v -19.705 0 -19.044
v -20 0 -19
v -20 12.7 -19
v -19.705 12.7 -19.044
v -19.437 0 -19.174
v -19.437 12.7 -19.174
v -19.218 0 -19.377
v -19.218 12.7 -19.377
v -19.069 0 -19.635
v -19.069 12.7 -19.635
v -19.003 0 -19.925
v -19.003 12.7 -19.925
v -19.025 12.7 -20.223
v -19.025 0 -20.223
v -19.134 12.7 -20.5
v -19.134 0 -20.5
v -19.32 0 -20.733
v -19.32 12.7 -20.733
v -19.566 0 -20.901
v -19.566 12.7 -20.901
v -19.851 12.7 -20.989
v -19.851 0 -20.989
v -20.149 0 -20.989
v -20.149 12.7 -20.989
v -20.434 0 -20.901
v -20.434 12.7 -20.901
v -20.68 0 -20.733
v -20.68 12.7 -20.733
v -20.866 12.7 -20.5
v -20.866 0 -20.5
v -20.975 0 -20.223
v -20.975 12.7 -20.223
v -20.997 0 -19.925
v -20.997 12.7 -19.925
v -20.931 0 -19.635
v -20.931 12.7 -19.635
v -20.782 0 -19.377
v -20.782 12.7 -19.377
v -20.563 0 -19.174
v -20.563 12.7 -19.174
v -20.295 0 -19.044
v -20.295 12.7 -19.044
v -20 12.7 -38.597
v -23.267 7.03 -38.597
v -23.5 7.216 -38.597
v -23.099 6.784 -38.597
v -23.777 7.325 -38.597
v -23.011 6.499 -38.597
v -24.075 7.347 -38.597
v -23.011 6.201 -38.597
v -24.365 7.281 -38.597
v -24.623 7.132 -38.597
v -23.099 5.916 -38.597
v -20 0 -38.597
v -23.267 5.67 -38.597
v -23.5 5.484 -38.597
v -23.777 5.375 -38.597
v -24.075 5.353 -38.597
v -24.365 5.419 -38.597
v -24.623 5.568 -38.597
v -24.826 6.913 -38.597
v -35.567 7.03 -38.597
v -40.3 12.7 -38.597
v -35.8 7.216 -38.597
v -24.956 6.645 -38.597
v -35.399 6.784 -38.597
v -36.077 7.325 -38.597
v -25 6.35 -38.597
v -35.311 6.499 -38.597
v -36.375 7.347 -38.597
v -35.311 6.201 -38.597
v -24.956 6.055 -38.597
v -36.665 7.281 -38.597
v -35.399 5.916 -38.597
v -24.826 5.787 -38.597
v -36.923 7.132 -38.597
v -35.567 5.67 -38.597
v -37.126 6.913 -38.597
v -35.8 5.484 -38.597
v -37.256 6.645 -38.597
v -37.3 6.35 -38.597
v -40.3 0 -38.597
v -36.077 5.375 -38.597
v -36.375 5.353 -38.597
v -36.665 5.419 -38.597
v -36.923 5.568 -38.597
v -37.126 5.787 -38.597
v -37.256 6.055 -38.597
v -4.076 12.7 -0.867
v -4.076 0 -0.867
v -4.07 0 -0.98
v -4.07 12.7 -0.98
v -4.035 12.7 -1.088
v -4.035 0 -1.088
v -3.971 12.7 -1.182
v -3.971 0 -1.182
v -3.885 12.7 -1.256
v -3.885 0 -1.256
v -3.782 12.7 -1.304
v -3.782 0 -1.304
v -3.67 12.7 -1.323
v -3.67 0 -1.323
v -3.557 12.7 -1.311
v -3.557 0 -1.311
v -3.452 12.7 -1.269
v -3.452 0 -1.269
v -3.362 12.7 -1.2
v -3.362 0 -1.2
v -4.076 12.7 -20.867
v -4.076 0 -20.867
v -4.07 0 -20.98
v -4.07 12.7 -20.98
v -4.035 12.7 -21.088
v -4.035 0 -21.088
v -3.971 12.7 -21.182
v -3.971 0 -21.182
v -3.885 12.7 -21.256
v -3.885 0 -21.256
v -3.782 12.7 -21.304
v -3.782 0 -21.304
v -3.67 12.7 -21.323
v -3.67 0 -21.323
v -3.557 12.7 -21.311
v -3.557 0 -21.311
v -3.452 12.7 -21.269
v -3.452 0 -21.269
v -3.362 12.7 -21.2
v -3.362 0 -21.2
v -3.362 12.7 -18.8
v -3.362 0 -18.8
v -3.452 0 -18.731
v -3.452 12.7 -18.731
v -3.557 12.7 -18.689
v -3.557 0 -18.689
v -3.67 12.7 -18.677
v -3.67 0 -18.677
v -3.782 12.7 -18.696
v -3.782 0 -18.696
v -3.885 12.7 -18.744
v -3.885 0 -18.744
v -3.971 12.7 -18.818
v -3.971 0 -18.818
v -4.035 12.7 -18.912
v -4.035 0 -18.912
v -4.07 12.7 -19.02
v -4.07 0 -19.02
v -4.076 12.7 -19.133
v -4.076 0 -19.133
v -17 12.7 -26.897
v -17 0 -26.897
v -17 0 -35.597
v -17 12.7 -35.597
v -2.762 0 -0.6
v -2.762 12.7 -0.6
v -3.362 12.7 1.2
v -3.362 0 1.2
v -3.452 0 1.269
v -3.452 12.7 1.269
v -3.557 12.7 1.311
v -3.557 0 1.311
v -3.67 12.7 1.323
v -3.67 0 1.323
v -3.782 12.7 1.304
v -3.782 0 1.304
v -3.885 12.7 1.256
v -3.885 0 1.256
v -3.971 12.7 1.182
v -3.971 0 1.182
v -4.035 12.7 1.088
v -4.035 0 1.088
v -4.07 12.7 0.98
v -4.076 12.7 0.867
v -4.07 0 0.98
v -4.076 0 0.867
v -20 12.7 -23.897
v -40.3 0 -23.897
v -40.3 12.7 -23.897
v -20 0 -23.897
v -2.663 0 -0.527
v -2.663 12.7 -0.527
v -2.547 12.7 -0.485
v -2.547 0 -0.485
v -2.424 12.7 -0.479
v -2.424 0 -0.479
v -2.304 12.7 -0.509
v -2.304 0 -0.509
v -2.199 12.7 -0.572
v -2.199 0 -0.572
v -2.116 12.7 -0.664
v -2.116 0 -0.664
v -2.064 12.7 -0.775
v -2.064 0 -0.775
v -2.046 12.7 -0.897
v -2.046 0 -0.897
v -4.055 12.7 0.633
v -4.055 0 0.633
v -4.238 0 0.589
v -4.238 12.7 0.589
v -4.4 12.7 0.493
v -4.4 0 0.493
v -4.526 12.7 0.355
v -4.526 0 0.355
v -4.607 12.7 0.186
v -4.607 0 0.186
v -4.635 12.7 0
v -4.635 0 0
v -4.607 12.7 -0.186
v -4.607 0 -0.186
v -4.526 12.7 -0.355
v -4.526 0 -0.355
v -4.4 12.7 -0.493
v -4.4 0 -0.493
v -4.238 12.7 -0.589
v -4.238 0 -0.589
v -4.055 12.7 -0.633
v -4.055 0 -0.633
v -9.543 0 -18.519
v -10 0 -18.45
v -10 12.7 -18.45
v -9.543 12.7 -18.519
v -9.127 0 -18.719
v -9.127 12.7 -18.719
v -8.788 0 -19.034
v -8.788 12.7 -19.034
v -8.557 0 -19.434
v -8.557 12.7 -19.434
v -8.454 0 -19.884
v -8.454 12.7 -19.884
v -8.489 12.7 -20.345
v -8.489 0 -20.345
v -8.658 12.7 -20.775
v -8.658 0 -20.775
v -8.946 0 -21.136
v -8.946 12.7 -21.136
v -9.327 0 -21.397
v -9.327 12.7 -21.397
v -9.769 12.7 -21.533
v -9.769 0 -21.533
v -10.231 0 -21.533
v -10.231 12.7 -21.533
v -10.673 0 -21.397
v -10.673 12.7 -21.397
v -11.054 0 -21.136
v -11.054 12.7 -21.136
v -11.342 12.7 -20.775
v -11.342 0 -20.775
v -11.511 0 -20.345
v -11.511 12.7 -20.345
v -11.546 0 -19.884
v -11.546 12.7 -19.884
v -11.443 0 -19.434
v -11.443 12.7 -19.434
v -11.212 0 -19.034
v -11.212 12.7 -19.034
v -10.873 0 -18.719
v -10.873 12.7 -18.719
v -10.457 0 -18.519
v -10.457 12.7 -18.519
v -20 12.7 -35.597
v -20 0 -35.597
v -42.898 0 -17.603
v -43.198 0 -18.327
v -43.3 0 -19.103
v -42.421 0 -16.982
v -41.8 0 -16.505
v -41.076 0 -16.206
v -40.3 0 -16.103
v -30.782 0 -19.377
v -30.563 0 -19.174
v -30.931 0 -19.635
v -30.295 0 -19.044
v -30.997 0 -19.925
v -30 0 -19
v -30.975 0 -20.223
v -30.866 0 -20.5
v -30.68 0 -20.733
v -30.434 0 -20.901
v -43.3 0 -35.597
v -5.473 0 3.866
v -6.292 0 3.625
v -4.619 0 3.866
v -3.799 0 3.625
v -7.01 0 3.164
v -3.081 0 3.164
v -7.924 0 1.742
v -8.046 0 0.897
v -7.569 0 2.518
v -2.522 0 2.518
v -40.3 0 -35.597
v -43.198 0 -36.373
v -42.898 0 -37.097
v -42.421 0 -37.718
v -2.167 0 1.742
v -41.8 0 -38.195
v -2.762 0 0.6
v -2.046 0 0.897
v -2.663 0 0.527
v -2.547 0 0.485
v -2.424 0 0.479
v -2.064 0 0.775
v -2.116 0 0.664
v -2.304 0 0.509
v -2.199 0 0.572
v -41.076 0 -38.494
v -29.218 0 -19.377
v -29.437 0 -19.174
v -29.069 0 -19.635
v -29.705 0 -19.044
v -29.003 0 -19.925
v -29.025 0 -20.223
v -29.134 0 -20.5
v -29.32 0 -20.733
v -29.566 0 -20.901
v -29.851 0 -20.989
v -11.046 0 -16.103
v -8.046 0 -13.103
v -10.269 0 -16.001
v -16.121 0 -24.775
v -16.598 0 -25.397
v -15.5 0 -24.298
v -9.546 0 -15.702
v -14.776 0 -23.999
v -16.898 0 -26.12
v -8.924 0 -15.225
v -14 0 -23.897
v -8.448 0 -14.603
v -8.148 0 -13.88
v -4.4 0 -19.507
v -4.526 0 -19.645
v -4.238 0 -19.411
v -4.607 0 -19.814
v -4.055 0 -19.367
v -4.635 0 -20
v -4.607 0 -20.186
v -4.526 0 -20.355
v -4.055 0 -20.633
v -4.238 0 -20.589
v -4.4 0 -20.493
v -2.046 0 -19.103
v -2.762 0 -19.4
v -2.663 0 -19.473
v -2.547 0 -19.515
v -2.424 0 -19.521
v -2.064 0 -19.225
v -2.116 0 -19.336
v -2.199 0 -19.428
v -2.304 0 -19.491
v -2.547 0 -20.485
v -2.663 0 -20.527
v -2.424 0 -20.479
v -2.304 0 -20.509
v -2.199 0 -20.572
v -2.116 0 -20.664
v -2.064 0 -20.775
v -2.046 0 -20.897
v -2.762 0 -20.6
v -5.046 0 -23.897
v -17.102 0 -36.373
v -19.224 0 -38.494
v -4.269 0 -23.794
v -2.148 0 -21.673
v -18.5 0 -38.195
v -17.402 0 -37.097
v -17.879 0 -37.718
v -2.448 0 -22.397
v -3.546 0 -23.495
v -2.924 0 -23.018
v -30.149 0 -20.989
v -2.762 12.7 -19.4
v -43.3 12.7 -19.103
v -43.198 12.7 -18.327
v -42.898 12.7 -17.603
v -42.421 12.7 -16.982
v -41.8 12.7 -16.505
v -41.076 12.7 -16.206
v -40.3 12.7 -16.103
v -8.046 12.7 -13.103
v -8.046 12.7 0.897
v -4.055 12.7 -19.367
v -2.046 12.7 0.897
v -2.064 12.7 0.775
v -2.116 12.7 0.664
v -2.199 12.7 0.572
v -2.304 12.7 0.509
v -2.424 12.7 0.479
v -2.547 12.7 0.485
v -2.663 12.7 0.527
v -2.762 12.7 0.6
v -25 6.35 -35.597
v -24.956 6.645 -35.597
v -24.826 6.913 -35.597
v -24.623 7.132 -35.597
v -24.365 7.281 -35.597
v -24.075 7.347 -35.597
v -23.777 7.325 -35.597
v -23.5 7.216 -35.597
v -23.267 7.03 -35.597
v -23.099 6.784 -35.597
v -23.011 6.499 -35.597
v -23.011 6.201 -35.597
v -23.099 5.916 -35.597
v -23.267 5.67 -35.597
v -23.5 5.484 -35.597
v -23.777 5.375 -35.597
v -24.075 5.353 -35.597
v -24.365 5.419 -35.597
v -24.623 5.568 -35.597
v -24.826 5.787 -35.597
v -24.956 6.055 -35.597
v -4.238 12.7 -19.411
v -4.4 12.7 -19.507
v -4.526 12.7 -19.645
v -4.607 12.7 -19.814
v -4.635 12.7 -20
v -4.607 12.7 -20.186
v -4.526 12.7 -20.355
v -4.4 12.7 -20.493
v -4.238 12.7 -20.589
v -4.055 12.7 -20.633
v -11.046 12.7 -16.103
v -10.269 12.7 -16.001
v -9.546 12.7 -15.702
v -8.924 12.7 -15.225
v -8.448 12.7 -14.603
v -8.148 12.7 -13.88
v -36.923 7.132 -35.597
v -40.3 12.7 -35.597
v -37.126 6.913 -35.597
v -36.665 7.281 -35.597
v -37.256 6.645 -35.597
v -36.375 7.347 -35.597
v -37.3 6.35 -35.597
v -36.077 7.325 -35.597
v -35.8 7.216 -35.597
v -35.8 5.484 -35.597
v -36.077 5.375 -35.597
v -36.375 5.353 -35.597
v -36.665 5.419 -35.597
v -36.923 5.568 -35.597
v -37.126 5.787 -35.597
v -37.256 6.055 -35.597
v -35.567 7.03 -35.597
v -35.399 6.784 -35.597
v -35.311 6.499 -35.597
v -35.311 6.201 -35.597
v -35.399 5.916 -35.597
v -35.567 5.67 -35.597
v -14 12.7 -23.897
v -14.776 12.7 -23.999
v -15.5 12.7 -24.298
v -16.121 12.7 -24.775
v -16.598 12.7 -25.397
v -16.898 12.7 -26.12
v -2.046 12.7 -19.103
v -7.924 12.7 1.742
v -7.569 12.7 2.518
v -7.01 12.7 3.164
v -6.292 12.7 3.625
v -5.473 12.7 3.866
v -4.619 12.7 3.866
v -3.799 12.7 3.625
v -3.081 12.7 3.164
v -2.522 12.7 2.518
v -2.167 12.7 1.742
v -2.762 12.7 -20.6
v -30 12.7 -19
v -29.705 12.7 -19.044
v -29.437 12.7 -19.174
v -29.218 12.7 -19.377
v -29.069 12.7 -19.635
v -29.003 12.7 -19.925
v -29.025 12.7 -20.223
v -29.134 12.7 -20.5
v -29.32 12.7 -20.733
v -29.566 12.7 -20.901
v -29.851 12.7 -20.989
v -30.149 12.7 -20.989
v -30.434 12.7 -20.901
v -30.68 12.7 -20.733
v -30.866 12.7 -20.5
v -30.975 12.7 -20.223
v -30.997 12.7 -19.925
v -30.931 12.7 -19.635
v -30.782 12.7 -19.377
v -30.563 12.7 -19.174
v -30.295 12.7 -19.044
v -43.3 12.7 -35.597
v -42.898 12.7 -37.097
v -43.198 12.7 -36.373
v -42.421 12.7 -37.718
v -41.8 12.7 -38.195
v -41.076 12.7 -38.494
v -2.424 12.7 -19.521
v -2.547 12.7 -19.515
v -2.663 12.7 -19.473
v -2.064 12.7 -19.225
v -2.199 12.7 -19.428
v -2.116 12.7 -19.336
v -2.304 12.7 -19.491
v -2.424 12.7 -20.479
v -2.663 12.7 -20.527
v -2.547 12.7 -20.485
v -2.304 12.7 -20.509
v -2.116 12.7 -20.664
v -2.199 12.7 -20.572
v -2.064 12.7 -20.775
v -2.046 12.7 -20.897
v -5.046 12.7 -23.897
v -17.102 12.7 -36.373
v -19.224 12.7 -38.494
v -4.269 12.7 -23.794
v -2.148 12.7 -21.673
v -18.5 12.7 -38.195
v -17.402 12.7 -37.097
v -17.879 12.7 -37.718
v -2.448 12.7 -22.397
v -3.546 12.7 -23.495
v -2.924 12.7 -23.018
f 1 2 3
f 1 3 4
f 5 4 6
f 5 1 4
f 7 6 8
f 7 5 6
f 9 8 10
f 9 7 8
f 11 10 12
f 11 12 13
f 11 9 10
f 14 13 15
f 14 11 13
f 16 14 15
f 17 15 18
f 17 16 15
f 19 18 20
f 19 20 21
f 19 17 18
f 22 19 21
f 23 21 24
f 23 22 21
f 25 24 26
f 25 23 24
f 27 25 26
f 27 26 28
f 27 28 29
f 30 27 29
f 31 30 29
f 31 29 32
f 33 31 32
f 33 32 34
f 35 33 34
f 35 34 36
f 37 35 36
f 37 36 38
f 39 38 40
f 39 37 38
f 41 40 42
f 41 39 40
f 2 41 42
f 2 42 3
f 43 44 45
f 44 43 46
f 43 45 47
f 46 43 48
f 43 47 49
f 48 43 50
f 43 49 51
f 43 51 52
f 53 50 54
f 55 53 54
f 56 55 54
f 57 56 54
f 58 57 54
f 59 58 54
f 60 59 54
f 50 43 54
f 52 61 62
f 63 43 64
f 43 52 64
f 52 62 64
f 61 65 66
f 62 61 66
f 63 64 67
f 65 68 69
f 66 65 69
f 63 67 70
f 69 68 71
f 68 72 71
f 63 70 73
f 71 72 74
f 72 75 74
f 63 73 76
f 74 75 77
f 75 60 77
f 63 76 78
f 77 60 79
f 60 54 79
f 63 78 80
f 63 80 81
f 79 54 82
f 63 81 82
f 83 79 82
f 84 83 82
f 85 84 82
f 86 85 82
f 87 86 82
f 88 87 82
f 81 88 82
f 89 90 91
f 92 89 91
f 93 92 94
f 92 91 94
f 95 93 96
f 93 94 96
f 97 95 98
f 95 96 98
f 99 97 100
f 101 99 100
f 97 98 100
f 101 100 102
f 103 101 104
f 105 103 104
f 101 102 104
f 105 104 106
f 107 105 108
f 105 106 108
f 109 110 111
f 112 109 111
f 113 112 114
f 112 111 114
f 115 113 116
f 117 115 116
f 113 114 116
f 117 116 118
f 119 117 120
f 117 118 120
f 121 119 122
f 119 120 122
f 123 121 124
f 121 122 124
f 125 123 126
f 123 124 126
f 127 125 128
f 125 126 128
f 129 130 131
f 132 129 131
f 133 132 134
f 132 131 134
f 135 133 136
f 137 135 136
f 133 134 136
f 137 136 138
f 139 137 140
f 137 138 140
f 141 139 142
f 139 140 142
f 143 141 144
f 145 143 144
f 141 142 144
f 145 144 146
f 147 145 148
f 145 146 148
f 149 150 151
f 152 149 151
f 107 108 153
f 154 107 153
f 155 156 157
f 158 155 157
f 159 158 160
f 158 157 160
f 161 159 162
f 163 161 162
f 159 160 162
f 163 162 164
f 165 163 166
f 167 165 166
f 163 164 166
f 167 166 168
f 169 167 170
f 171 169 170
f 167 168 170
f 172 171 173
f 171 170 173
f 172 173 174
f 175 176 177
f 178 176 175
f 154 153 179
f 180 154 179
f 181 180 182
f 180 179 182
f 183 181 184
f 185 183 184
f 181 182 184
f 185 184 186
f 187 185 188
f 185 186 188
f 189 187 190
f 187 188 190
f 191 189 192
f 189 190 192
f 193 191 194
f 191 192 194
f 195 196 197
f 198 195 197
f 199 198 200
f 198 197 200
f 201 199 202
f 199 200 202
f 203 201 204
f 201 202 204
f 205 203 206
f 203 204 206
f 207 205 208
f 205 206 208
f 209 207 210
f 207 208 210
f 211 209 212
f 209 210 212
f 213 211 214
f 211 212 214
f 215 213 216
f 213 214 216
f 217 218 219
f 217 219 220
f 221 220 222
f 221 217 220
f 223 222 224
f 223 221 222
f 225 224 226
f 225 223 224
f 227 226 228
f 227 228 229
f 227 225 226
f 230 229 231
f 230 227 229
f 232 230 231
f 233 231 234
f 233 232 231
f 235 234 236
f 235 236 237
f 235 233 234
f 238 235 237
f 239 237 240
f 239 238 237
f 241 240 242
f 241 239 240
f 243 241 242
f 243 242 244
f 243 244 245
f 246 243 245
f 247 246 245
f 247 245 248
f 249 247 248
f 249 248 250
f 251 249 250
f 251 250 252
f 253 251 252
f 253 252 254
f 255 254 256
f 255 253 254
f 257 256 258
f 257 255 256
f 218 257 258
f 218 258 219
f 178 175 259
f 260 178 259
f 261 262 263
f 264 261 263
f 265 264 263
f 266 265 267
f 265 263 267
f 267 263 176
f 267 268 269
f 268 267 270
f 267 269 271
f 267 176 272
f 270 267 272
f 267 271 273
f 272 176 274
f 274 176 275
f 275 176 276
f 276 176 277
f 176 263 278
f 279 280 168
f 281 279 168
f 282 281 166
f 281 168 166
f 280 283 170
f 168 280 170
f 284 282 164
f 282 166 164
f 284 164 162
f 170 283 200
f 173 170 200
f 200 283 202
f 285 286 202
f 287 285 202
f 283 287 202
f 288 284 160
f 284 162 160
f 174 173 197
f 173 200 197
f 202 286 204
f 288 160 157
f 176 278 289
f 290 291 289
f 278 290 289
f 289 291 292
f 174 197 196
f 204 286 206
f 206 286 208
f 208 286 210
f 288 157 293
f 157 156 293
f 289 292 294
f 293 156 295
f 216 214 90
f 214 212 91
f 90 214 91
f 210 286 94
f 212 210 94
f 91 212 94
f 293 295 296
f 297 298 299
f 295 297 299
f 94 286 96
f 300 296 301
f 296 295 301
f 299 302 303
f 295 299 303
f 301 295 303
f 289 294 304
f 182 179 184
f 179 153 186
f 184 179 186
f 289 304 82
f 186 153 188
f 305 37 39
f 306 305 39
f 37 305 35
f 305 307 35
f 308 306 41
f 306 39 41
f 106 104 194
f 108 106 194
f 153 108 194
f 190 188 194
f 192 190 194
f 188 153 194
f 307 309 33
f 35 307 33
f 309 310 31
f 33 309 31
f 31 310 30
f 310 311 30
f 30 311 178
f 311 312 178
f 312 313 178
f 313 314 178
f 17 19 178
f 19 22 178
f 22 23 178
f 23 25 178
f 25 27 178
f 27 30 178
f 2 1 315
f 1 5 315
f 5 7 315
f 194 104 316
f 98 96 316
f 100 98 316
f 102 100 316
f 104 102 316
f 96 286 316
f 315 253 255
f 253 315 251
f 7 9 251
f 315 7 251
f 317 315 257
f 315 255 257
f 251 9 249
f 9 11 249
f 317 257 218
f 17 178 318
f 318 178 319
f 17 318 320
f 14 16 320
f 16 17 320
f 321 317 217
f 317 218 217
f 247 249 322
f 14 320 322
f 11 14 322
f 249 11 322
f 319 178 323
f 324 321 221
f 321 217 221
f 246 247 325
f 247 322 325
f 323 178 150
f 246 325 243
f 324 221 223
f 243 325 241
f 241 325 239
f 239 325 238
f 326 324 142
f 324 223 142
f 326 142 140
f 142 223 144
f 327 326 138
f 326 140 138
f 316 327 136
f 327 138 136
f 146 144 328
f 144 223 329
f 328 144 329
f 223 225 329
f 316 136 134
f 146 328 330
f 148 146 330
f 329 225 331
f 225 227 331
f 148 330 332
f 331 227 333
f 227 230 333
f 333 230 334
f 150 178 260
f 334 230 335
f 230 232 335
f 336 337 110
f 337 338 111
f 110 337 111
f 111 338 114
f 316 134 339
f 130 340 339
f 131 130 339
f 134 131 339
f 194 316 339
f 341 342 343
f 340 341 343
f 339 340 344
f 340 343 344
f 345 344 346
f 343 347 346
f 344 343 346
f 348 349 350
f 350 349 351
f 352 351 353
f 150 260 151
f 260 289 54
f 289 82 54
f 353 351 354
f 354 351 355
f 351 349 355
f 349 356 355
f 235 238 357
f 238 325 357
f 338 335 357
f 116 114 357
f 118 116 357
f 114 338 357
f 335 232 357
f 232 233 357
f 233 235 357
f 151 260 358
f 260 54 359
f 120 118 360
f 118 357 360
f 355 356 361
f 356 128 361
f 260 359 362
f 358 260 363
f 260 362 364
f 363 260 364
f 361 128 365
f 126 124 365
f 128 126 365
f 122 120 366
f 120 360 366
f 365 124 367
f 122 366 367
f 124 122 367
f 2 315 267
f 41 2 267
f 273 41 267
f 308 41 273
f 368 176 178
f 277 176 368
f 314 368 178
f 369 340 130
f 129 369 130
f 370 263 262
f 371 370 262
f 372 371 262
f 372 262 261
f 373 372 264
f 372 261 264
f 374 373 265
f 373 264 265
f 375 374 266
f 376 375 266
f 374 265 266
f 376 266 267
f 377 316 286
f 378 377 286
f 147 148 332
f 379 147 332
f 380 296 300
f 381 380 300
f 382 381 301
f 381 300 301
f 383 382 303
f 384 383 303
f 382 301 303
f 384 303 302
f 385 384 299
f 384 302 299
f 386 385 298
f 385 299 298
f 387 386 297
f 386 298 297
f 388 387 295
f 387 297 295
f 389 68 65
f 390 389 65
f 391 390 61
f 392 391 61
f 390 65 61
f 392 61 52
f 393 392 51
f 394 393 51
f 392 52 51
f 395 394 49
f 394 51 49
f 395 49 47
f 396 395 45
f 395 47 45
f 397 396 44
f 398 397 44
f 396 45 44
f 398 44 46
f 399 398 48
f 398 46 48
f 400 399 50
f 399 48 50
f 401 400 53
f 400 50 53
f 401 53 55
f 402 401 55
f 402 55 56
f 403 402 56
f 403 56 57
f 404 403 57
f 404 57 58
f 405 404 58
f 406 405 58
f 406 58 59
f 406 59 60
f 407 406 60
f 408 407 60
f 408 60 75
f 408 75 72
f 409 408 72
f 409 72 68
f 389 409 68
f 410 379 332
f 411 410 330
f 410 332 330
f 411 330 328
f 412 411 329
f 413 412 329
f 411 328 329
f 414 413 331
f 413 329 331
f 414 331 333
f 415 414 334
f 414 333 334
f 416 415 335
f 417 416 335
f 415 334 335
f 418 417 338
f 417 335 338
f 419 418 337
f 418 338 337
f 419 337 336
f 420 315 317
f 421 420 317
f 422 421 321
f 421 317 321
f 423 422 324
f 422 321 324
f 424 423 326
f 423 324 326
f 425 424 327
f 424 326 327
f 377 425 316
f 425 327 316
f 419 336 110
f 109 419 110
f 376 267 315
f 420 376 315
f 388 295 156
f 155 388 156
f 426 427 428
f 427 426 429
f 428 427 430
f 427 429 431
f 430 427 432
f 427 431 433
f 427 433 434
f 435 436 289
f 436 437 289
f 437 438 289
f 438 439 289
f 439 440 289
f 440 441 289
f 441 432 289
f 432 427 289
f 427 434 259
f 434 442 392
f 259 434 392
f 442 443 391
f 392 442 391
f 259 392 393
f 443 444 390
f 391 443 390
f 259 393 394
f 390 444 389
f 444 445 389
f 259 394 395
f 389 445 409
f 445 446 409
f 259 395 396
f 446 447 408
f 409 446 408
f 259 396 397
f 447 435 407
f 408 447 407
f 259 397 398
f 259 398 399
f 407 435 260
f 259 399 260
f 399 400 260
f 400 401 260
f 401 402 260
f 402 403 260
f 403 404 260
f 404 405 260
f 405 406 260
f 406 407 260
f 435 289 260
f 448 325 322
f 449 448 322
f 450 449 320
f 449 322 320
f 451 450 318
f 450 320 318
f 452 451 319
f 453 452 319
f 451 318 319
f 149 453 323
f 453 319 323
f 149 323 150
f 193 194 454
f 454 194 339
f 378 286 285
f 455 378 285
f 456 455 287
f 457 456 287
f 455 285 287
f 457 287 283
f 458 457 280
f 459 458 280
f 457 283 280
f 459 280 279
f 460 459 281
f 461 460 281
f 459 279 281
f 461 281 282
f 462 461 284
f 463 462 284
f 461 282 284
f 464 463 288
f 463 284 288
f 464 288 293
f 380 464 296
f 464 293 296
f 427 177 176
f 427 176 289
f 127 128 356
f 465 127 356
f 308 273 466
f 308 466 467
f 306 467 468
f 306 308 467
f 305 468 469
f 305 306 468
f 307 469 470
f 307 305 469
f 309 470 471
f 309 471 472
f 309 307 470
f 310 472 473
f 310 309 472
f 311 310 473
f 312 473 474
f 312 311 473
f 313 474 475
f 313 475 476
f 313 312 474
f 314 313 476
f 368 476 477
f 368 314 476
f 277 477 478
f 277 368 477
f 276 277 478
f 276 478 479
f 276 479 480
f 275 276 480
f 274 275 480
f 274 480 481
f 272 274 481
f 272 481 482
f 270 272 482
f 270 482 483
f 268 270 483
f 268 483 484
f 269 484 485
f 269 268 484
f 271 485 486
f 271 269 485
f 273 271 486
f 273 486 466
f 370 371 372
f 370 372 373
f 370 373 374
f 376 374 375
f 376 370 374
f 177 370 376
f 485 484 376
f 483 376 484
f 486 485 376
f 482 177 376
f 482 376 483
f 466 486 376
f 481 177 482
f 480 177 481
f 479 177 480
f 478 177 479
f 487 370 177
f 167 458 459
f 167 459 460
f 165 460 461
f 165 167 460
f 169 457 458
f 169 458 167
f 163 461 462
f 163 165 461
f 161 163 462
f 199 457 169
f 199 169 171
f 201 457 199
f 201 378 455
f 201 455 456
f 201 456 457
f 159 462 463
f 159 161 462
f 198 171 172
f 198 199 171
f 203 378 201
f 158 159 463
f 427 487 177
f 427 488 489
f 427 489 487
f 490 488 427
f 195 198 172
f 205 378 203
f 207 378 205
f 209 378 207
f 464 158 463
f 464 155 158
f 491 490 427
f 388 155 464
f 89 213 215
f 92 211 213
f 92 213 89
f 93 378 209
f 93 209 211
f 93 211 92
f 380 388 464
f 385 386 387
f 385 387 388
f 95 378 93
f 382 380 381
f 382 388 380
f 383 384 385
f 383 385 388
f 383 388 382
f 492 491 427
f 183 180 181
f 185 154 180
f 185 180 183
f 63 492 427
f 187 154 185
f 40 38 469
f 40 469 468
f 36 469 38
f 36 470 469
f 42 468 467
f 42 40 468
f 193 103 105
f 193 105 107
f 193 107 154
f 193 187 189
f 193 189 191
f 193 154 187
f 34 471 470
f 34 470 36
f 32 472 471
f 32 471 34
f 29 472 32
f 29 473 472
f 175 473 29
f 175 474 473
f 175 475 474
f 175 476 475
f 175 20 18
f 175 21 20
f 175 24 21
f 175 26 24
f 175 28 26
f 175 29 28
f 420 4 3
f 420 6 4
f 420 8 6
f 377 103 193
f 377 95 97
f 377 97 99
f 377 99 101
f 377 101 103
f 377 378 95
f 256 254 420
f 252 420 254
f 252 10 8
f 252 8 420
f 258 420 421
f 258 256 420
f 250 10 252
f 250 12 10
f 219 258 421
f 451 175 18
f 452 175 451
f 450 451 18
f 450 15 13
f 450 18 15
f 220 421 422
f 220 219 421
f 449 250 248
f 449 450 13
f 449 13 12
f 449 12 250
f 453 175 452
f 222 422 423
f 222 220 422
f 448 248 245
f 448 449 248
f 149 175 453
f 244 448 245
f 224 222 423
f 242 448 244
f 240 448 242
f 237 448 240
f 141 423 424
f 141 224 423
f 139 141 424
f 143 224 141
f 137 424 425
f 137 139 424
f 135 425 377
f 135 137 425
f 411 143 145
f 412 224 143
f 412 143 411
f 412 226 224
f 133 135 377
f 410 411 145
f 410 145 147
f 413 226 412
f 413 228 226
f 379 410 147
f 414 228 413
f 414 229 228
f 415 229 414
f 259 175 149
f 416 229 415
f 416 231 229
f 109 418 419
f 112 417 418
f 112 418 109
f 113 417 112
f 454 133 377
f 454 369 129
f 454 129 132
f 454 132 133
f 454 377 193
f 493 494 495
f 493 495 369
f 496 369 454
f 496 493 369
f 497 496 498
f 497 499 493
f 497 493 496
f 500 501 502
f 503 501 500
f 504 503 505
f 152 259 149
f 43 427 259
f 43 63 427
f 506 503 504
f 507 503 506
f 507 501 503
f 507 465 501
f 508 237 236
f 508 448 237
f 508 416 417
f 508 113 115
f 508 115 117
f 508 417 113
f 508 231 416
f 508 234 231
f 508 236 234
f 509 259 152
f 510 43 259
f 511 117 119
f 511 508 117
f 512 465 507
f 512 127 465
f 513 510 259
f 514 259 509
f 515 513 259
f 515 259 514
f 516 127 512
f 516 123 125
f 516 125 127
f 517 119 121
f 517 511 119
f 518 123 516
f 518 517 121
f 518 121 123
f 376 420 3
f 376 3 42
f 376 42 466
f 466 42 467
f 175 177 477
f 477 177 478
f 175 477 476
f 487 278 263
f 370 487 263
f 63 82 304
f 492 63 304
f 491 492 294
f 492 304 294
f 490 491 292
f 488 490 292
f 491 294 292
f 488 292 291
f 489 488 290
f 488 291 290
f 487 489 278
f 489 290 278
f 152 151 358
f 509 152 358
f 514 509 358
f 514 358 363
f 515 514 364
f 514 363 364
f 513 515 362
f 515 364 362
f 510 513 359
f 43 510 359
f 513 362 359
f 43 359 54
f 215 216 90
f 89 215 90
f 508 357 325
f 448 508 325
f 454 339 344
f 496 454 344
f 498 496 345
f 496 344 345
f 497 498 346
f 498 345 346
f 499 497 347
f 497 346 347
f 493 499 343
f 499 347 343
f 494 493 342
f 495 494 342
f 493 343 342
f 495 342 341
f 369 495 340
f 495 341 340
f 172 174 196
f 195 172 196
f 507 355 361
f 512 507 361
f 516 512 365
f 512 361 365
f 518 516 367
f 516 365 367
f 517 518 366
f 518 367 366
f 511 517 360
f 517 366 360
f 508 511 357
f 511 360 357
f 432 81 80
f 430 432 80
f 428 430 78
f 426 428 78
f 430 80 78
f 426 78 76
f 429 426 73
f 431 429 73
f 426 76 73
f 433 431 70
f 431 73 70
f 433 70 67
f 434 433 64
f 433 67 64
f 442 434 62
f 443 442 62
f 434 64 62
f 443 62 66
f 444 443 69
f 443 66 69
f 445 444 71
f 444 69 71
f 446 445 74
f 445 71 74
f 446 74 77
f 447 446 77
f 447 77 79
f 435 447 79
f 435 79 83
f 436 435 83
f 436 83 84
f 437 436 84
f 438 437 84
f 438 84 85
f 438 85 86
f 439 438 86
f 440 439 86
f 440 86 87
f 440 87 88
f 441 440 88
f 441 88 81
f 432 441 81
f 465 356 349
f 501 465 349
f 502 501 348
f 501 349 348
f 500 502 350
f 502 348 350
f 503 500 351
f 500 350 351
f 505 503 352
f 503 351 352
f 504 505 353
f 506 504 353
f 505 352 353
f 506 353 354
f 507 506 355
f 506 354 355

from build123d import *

# Parameters (mm, degrees)
SKETCH1_R           = 1
SKETCH1_R_2         = 1.55
SKETCH1_W           = 20.3
SKETCH1_H           = 11.7
BOSS_EXTRUDE1_DEPTH = 12.7
CUT_EXTRUDE1_REACH  = 63.983
SKETCH2_R           = 1


with BuildPart() as part:
    # Sketch1 → Boss-Extrude1 (new body)
    with BuildSketch(Plane(origin=(0, 0, 0), x_dir=(1, 0, 0), z_dir=(0, 1, 0))):
        with BuildLine():
            Line((-4.055343897, 0.632583633), (-4.075844459, 0.866906139))
            ThreePointArc((-4.075844459, 0.866906139), (-3.83530083, 1.283539926), (-3.361522369, 1.2))
            Line((-3.361522369, 1.2), (-2.761522369, 0.6))
            ThreePointArc((-2.761522369, 0.6), (-2.304491577, 0.509090923), (-2.04560443, 0.89654292))
            Line((-2.04560443, 0.89654292), (-2.04560443, 19.10345708))
            ThreePointArc((-2.04560443, 19.10345708), (-2.304491577, 19.490909077), (-2.761522369, 19.4))
            Line((-2.761522369, 19.4), (-3.361522369, 18.8))
            ThreePointArc((-3.361522369, 18.8), (-3.83530083, 18.716460074), (-4.075844459, 19.133093861))
            Line((-4.075844459, 19.133093861), (-4.055343897, 19.367416367))
            ThreePointArc((-4.055343897, 19.367416367), (-4.635, 20), (-4.055343897, 20.632583633))
            Line((-4.055343897, 20.632583633), (-4.075844459, 20.866906139))
            ThreePointArc((-4.075844459, 20.866906139), (-3.83530083, 21.283539926), (-3.361522369, 21.2))
            Line((-3.361522369, 21.2), (-2.761522369, 20.6))
            ThreePointArc((-2.761522369, 20.6), (-2.304491577, 20.509090923), (-2.04560443, 20.89654292))
            ThreePointArc((-2.04560443, 20.89654292), (-2.924284086, 23.017863263), (-5.04560443, 23.89654292))
            Line((-5.04560443, 23.89654292), (-14, 23.89654292))
            ThreePointArc((-14, 23.89654292), (-16.121320344, 24.775222576), (-17, 26.89654292))
            Line((-17, 26.89654292), (-17, 35.59654292))
            ThreePointArc((-17, 35.59654292), (-17.878679656, 37.717863263), (-20, 38.59654292))
            Line((-20, 38.59654292), (-40.3, 38.59654292))
            ThreePointArc((-40.3, 38.59654292), (-42.421320344, 37.717863263), (-43.3, 35.59654292))
            Line((-43.3, 35.59654292), (-43.3, 19.10345708))
            ThreePointArc((-43.3, 19.10345708), (-42.421320344, 16.982136737), (-40.3, 16.10345708))
            Line((-40.3, 16.10345708), (-11.04560443, 16.10345708))
            ThreePointArc((-11.04560443, 16.10345708), (-8.924284086, 15.224777424), (-8.04560443, 13.10345708))
            Line((-8.04560443, 13.10345708), (-8.04560443, -0.89654292))
            ThreePointArc((-8.04560443, -0.89654292), (-5.04560443, -3.89654292), (-2.04560443, -0.89654292))
            ThreePointArc((-2.04560443, -0.89654292), (-2.304491577, -0.509090923), (-2.761522369, -0.6))
            Line((-2.761522369, -0.6), (-3.361522369, -1.2))
            ThreePointArc((-3.361522369, -1.2), (-3.83530083, -1.283539926), (-4.075844459, -0.866906139))
            Line((-4.075844459, -0.866906139), (-4.055343897, -0.632583633))
            ThreePointArc((-4.055343897, -0.632583633), (-4.635, 0), (-4.055343897, 0.632583633))
        make_face()
        with Locations(Location((-20, 20, 0), (0, 0, 270))):
            Circle(SKETCH1_R, mode=Mode.SUBTRACT)
        with Locations(Location((-10, 20, 0), (0, 0, 270))):
            Circle(SKETCH1_R_2, mode=Mode.SUBTRACT)
        with Locations(Location((-30, 20, 0), (0, 0, 270))):
            Circle(SKETCH1_R, mode=Mode.SUBTRACT)
        with Locations((-30.15, 29.74654292)):
            Rectangle(SKETCH1_W, SKETCH1_H, mode=Mode.SUBTRACT)
    extrude(amount=BOSS_EXTRUDE1_DEPTH)

    # Sketch2 → Cut-Extrude1 (cut, up to next)
    with BuildSketch(Plane(origin=(0, 0, -38.59654292), x_dir=(-1, 0, 0), z_dir=(0, 0, -1)), mode=Mode.PRIVATE) as cut_extrude1_sk1:
        with Locations((36.3, 6.35)):
            Circle(SKETCH2_R)
    cut_extrude1_tool1 = extrude(cut_extrude1_sk1.sketch, amount=-CUT_EXTRUDE1_REACH, mode=Mode.PRIVATE) & part.part
    # Sketch2 → Cut-Extrude1 (cut, up to next)
    with BuildSketch(Plane(origin=(0, 0, -38.59654292), x_dir=(-1, 0, 0), z_dir=(0, 0, -1)), mode=Mode.PRIVATE) as cut_extrude1_sk2:
        with Locations((24, 6.35)):
            Circle(SKETCH2_R)
    cut_extrude1_tool2 = extrude(cut_extrude1_sk2.sketch, amount=-CUT_EXTRUDE1_REACH, mode=Mode.PRIVATE) & part.part
    add(cut_extrude1_tool1.solids().sort_by_distance((-36.3, 6.35, -38.596543))[0], mode=Mode.SUBTRACT)
    add(cut_extrude1_tool2.solids().sort_by_distance((-24, 6.35, -38.596543))[0], mode=Mode.SUBTRACT)


solid = part.part
